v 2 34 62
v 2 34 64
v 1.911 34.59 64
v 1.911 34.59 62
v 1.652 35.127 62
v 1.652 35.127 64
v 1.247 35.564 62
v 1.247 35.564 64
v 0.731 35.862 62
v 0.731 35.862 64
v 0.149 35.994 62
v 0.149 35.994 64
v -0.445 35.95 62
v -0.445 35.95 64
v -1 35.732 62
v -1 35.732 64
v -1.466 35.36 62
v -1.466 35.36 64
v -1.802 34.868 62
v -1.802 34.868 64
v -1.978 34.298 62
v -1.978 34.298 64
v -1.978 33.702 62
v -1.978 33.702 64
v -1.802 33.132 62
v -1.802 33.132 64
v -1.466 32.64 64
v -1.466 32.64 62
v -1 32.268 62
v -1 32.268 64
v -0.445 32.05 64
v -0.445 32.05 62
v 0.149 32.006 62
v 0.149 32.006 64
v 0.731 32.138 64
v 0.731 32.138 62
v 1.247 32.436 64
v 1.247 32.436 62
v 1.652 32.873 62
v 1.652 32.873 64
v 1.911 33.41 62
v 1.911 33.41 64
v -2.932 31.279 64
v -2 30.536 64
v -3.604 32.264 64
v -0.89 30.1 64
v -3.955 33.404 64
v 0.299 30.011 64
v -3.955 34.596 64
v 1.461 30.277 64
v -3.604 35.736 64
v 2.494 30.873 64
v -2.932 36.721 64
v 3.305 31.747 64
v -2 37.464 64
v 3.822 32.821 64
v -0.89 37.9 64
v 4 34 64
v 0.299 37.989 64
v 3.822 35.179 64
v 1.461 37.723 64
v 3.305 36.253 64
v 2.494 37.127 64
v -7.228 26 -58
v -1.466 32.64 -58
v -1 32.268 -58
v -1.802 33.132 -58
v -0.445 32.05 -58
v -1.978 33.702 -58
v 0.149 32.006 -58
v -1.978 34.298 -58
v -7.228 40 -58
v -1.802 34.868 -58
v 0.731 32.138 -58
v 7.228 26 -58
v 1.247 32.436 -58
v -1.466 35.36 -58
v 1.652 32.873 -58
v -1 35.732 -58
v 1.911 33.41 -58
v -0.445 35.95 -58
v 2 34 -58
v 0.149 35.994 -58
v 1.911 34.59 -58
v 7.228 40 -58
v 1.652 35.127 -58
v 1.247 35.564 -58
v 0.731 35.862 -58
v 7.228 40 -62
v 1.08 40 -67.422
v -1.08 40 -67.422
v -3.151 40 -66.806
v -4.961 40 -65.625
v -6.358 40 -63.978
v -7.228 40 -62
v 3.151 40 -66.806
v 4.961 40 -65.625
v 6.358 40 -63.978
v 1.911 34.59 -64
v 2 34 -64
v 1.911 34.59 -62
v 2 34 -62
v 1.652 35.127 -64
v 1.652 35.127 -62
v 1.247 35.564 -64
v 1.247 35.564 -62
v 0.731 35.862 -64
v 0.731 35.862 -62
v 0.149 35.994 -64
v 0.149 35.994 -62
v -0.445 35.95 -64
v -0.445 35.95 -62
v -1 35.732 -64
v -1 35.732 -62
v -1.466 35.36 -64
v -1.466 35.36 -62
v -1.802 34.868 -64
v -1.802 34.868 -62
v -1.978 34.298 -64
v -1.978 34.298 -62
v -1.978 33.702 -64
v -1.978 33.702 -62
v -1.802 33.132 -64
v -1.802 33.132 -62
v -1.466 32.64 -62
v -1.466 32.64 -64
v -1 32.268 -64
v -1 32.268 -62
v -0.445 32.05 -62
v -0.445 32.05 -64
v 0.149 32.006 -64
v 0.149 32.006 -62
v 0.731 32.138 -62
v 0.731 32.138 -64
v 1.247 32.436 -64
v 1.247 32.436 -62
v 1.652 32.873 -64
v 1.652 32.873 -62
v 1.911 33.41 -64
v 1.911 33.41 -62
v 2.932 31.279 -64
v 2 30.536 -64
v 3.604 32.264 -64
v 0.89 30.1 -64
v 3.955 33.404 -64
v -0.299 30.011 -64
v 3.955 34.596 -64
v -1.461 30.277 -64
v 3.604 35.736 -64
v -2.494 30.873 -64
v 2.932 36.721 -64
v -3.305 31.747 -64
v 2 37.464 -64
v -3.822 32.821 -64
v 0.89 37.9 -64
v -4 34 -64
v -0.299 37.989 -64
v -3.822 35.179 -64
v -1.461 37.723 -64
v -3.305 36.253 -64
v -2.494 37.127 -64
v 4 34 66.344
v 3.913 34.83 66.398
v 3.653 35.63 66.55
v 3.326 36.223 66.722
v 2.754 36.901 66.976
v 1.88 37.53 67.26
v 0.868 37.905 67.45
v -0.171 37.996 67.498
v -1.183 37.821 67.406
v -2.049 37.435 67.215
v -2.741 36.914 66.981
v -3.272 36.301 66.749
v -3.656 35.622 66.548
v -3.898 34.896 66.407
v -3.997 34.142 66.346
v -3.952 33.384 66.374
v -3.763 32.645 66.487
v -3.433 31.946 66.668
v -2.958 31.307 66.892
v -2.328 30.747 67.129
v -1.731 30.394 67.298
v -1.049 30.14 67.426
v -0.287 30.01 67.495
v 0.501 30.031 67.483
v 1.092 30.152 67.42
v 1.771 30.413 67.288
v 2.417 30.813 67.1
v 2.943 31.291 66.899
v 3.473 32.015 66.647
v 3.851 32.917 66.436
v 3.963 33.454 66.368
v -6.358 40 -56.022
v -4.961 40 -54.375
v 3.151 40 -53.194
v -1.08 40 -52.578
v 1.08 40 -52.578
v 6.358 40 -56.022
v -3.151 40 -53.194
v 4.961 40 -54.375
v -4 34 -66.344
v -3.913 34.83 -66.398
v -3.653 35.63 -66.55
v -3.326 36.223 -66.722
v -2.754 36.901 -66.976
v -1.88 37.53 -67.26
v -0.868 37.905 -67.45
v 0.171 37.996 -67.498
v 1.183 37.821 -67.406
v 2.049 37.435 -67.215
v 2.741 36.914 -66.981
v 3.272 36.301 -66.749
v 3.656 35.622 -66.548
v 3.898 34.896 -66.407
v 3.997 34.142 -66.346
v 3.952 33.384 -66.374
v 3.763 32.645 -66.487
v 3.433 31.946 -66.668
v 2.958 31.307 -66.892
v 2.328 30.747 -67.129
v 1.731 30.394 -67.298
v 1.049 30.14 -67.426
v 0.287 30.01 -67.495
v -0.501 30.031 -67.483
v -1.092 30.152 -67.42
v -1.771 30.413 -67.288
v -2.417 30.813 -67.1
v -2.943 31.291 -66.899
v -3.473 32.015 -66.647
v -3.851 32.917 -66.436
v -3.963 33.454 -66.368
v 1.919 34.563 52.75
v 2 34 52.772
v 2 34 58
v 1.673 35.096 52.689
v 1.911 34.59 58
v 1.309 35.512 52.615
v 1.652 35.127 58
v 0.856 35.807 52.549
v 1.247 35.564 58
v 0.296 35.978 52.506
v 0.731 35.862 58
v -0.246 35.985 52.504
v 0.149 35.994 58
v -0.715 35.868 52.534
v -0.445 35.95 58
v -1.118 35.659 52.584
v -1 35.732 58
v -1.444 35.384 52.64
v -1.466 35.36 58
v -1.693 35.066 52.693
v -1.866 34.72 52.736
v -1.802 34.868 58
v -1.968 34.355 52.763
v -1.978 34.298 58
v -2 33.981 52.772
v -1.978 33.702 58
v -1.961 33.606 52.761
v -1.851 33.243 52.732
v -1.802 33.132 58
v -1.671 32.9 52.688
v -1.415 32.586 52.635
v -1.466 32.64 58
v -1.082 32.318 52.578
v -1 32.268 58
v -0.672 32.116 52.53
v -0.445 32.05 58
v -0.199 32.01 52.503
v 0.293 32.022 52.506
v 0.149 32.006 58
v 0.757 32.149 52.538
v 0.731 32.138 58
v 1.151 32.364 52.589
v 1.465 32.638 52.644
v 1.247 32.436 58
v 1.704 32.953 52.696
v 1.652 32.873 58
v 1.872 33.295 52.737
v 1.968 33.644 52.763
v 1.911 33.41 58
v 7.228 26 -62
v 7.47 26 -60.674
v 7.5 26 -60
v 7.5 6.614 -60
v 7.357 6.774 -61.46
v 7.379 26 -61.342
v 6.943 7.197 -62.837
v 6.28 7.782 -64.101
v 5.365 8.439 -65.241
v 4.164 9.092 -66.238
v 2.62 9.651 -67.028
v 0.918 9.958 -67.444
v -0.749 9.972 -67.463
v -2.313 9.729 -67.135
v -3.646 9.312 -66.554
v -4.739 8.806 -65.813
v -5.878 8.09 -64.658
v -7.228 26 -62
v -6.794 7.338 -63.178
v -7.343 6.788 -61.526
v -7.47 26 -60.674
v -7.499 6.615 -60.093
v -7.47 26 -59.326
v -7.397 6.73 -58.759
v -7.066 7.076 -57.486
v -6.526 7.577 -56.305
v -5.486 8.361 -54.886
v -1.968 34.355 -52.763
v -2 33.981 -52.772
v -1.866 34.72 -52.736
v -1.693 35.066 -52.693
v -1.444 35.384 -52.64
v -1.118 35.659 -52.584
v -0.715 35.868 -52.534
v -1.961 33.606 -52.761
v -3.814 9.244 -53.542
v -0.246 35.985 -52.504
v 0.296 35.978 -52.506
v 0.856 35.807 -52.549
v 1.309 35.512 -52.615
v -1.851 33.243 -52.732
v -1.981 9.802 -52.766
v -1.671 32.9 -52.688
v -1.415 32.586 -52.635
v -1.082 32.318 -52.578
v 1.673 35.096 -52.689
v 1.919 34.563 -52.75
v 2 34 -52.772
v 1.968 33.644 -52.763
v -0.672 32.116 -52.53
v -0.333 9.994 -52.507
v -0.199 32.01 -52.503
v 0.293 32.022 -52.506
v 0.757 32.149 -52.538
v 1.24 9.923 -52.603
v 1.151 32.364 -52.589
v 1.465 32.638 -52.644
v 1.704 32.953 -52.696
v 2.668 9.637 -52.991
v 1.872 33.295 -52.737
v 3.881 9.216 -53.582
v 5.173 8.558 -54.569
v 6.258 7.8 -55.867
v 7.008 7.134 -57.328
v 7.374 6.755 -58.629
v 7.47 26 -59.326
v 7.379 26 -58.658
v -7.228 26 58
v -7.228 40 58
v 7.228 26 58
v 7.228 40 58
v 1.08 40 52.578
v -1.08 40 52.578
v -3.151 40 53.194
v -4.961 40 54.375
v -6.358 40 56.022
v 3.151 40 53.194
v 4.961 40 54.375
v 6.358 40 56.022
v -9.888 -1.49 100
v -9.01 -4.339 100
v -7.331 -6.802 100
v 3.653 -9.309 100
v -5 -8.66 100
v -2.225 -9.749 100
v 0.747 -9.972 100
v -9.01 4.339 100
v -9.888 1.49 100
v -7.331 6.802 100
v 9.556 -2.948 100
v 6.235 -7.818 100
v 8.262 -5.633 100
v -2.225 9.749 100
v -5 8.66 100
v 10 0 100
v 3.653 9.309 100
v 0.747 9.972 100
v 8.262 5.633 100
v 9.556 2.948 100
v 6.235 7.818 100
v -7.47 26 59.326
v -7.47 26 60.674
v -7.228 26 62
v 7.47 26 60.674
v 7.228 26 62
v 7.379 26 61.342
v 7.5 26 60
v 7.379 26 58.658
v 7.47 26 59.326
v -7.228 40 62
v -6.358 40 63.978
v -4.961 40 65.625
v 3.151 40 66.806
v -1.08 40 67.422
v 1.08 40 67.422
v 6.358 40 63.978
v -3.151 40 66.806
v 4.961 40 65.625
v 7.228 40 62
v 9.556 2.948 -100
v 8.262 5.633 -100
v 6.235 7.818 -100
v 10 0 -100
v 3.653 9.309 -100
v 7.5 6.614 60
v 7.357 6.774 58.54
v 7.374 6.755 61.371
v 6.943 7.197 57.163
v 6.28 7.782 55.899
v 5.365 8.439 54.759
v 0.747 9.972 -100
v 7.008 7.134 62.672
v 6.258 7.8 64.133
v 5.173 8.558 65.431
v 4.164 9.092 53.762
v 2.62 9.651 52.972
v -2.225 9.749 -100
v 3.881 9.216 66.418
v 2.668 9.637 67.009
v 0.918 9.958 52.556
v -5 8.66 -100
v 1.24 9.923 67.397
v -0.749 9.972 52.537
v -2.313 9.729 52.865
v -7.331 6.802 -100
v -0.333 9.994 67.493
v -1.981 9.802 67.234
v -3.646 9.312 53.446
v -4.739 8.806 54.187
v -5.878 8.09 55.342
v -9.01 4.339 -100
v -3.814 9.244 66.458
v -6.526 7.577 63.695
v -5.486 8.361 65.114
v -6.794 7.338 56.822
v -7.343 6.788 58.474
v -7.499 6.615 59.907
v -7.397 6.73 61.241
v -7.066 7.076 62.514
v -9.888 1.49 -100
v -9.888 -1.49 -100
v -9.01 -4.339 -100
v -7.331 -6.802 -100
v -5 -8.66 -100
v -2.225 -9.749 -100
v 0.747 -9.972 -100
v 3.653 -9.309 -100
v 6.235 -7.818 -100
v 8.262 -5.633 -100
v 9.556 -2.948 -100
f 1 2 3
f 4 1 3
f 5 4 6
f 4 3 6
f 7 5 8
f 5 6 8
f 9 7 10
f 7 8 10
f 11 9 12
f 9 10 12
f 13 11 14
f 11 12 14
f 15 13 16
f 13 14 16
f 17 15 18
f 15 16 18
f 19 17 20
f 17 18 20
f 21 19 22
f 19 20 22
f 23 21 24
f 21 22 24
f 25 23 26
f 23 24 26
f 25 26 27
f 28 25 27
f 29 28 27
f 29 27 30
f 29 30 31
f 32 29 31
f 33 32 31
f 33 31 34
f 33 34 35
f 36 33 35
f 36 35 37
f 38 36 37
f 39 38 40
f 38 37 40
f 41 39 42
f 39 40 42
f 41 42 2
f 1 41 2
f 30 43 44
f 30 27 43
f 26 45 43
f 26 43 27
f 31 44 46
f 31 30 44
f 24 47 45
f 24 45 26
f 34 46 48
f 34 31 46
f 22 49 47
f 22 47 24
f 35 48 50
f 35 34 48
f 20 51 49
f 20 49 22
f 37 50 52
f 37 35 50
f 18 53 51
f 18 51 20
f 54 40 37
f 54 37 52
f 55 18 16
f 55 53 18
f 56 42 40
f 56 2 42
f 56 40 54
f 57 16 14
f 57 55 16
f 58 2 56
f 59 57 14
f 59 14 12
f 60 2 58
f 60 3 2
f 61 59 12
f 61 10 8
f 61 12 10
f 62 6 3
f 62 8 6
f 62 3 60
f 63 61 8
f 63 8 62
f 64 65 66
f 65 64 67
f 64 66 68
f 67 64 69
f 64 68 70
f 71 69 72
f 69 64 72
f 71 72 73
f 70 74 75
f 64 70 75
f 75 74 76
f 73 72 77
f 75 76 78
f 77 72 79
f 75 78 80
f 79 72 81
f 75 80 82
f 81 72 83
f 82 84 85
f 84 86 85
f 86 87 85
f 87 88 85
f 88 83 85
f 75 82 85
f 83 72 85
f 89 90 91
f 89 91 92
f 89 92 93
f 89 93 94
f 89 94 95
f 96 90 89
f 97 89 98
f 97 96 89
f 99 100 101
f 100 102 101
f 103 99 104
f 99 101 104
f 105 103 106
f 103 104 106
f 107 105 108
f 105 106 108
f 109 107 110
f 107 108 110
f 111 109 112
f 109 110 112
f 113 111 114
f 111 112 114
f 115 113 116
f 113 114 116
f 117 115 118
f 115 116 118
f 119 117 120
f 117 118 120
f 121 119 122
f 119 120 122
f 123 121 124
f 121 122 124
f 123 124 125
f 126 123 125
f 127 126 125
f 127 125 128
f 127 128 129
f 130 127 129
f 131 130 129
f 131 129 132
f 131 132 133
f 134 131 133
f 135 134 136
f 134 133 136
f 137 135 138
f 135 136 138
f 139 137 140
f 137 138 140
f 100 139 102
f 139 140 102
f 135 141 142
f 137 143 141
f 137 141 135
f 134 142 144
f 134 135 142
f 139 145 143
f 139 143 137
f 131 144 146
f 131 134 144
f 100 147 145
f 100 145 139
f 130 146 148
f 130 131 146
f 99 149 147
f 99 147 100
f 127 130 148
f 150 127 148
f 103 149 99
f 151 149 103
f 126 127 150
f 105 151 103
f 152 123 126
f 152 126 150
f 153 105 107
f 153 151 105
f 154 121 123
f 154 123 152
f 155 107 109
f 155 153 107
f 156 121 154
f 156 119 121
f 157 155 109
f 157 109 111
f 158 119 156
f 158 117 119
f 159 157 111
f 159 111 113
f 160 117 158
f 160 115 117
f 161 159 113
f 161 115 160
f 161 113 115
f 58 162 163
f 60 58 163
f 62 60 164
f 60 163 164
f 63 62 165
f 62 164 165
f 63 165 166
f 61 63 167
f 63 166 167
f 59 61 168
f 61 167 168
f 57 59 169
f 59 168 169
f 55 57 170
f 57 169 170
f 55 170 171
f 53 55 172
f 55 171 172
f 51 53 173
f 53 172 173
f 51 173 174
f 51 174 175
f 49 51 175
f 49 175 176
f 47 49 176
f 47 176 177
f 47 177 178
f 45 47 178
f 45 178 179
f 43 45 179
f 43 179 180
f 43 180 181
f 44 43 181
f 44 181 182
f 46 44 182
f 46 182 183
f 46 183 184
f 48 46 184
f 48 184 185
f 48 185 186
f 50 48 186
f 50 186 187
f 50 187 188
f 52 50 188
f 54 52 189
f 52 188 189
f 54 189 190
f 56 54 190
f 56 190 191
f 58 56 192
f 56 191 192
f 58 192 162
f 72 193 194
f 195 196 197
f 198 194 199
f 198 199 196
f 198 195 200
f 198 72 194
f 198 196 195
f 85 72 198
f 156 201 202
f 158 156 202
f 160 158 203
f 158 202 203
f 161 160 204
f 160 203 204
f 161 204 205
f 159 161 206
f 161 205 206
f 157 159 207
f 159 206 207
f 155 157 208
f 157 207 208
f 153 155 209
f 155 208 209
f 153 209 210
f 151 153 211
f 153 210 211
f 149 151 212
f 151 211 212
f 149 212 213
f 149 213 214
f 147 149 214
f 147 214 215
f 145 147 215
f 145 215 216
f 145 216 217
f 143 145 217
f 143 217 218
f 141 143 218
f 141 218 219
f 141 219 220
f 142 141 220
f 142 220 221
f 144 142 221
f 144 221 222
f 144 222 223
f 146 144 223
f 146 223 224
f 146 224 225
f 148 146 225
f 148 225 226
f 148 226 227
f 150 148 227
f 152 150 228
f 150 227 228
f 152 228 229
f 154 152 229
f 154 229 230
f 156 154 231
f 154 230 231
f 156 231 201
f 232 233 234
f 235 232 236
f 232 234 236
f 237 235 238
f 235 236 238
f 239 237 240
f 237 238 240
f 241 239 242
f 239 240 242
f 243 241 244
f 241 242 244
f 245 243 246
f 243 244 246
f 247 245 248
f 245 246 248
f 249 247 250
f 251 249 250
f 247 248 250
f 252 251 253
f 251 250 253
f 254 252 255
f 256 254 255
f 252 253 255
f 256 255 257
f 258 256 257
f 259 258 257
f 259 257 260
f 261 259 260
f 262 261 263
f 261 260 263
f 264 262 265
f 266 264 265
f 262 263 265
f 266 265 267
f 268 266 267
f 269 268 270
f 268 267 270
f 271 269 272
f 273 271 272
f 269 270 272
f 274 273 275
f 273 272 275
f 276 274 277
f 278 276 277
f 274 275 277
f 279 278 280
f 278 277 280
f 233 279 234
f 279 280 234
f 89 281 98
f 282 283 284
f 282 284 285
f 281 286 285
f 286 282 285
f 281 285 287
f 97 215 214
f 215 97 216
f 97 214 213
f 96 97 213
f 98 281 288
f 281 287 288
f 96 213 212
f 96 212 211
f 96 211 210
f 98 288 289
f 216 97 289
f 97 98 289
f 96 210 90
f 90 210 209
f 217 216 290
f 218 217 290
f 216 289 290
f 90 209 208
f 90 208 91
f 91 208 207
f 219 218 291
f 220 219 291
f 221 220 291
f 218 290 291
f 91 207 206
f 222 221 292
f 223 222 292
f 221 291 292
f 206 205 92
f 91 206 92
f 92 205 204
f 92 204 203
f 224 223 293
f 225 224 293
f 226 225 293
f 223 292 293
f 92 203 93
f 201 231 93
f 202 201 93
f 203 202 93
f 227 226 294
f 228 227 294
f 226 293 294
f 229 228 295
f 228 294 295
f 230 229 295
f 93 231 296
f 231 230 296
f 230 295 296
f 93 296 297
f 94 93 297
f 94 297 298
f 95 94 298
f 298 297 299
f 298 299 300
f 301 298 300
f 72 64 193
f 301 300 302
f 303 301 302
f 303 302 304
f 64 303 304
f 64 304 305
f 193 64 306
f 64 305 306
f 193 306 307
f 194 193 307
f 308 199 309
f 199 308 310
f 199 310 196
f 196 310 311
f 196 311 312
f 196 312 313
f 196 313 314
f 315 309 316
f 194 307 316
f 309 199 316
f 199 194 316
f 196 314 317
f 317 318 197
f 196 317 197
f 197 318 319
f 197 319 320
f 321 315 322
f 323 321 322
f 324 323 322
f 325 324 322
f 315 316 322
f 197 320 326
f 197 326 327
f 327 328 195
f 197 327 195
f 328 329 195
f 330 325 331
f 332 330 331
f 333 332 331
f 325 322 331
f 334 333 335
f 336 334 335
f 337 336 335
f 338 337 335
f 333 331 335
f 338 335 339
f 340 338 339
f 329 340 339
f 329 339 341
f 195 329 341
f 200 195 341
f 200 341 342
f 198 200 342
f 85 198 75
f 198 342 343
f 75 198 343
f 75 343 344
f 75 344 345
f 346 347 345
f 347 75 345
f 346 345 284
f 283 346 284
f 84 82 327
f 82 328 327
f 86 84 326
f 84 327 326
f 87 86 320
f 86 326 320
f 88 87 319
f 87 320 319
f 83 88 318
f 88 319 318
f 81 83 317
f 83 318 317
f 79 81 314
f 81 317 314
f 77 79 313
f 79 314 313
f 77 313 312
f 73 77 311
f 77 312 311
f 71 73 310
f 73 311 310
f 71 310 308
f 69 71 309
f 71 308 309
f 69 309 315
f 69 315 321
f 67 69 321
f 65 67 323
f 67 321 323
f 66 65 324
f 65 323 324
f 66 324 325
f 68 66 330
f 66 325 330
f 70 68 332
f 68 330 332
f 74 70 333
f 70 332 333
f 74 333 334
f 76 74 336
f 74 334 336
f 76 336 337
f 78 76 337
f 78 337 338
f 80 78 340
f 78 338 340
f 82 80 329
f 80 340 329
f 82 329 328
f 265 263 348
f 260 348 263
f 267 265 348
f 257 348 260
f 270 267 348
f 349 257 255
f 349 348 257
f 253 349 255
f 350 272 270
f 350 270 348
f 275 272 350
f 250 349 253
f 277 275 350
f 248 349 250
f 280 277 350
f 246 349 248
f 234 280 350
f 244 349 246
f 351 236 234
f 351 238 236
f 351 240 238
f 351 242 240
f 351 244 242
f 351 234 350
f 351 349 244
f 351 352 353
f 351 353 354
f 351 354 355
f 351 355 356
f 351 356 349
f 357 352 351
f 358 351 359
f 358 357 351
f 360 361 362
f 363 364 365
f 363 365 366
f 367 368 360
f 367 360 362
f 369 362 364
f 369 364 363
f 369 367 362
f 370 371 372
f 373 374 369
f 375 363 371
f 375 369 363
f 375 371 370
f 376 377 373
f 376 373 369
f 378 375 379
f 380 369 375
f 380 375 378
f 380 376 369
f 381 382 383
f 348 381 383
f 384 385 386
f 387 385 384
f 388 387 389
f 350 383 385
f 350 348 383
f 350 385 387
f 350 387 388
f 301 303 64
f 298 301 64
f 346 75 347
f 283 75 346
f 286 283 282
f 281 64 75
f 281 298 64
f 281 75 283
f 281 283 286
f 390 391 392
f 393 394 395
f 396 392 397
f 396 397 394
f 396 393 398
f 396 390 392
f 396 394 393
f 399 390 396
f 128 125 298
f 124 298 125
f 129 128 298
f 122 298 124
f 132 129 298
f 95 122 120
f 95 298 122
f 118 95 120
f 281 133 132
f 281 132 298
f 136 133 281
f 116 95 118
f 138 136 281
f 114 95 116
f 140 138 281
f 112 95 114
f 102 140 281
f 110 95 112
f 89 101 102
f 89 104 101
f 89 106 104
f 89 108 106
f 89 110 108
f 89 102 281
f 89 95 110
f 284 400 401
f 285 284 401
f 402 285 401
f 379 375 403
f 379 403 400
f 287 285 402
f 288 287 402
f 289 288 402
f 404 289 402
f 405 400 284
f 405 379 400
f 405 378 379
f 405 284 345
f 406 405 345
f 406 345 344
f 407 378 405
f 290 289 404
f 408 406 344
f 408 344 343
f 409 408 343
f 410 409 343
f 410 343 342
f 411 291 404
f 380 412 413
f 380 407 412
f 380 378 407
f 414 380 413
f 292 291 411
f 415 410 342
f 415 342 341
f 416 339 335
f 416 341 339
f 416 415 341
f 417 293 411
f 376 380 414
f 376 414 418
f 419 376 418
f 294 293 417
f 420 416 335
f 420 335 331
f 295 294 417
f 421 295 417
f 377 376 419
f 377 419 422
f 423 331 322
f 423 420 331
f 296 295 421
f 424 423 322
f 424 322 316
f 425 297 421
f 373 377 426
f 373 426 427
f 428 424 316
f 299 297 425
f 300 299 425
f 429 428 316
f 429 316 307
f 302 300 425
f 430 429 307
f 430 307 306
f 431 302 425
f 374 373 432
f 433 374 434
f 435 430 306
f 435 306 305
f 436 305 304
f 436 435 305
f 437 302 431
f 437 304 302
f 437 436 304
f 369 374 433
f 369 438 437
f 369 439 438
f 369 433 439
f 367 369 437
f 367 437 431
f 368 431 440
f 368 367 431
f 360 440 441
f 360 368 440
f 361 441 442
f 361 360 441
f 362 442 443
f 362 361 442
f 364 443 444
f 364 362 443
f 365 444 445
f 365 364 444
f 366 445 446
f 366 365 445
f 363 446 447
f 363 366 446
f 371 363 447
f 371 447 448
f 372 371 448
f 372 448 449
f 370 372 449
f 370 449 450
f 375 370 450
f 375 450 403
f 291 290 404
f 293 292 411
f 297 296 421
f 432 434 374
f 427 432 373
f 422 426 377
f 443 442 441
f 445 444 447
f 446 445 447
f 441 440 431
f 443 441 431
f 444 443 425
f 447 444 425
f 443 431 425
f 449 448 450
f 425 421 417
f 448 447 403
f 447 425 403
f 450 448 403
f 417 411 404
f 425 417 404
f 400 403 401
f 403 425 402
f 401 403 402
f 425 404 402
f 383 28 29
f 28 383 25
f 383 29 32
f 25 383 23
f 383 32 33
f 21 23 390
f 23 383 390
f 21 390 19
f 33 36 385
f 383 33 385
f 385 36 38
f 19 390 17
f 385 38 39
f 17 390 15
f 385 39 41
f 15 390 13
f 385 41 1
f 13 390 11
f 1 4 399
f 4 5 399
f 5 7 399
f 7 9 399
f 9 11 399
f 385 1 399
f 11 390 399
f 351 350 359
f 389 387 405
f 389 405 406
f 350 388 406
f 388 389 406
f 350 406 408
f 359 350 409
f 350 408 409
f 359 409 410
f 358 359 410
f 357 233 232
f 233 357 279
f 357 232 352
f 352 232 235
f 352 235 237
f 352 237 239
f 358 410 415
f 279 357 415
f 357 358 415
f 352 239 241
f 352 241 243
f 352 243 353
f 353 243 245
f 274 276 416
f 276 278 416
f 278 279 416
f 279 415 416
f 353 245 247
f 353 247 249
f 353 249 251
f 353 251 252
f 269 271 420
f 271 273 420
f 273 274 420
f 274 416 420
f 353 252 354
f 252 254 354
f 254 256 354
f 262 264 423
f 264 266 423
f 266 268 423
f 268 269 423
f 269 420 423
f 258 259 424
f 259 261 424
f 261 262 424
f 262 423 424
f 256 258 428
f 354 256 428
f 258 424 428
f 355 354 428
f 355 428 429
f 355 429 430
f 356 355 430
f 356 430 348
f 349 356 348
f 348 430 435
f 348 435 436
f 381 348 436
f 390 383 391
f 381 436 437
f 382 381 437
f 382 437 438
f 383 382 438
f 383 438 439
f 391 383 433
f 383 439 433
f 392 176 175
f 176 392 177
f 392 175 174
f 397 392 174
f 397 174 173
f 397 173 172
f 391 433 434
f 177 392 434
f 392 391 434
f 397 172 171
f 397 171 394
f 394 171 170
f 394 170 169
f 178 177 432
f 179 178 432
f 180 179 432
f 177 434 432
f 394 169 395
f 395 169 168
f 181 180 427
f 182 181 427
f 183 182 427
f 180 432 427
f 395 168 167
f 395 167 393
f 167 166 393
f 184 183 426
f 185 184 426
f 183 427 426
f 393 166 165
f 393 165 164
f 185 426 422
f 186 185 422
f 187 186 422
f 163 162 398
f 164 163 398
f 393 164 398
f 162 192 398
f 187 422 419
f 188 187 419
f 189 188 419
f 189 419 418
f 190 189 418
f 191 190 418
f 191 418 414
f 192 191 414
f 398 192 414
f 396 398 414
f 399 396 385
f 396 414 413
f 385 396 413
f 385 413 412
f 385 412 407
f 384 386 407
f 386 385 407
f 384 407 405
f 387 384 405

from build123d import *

# Parameters (mm, degrees)
SKETCH1_R           = 10
BOSS_EXTRUDE1_DEPTH = 100
SKETCH2_R           = 7.5
BOSS_EXTRUDE2_DEPTH = 40
SKETCH3_W           = 15
SKETCH3_H           = 4
CUT_EXTRUDE1_DEPTH  = 14
SKETCH4_R           = 2
CUT_EXTRUDE2_DEPTH  = 70
SKETCH5_R           = 4
CUT_EXTRUDE3_DEPTH  = 36
SKETCH6_R           = 4
CUT_EXTRUDE4_DEPTH  = 36


with BuildPart() as part:
    # Sketch1 → Boss-Extrude1 (new body, symmetric)
    with BuildSketch(Plane.XY):
        Circle(SKETCH1_R)
    extrude(amount=BOSS_EXTRUDE1_DEPTH, both=True)

    # Sketch2 → Boss-Extrude2 (add)
    with BuildSketch(Plane(origin=(0, 0, 0), x_dir=(1, 0, 0), z_dir=(0, 1, 0))):
        with Locations((0, 60)):
            Circle(SKETCH2_R)
        with Locations((0, -60)):
            Circle(SKETCH2_R)
    extrude(amount=BOSS_EXTRUDE2_DEPTH)

    # Sketch3 → Cut-Extrude1 (cut)
    with BuildSketch(Plane(origin=(0, 40, 0), x_dir=(1, 0, 0), z_dir=(0, 1, 0))):
        with Locations((0, -60)):
            Rectangle(SKETCH3_W, SKETCH3_H)
        with Locations((0, 60)):
            Rectangle(SKETCH3_W, SKETCH3_H)
    extrude(amount=-CUT_EXTRUDE1_DEPTH, mode=Mode.SUBTRACT)

    # Sketch4 → Cut-Extrude2 (cut, symmetric)
    with BuildSketch(Plane.XY):
        with Locations((0, 34)):
            Circle(SKETCH4_R)
    extrude(amount=CUT_EXTRUDE2_DEPTH, both=True, mode=Mode.SUBTRACT)

    # Sketch5 → Cut-Extrude3 (cut)
    with BuildSketch(Plane(origin=(0, 0, -100), x_dir=(-1, 0, 0), z_dir=(0, 0, -1))):
        with Locations((0, 34)):
            Circle(SKETCH5_R)
    extrude(amount=-CUT_EXTRUDE3_DEPTH, mode=Mode.SUBTRACT)

    # Sketch6 → Cut-Extrude4 (cut)
    with BuildSketch(Plane.XY.offset(100)):
        with Locations((0, 34)):
            Circle(SKETCH6_R)
    extrude(amount=-CUT_EXTRUDE4_DEPTH, mode=Mode.SUBTRACT)


solid = part.part
